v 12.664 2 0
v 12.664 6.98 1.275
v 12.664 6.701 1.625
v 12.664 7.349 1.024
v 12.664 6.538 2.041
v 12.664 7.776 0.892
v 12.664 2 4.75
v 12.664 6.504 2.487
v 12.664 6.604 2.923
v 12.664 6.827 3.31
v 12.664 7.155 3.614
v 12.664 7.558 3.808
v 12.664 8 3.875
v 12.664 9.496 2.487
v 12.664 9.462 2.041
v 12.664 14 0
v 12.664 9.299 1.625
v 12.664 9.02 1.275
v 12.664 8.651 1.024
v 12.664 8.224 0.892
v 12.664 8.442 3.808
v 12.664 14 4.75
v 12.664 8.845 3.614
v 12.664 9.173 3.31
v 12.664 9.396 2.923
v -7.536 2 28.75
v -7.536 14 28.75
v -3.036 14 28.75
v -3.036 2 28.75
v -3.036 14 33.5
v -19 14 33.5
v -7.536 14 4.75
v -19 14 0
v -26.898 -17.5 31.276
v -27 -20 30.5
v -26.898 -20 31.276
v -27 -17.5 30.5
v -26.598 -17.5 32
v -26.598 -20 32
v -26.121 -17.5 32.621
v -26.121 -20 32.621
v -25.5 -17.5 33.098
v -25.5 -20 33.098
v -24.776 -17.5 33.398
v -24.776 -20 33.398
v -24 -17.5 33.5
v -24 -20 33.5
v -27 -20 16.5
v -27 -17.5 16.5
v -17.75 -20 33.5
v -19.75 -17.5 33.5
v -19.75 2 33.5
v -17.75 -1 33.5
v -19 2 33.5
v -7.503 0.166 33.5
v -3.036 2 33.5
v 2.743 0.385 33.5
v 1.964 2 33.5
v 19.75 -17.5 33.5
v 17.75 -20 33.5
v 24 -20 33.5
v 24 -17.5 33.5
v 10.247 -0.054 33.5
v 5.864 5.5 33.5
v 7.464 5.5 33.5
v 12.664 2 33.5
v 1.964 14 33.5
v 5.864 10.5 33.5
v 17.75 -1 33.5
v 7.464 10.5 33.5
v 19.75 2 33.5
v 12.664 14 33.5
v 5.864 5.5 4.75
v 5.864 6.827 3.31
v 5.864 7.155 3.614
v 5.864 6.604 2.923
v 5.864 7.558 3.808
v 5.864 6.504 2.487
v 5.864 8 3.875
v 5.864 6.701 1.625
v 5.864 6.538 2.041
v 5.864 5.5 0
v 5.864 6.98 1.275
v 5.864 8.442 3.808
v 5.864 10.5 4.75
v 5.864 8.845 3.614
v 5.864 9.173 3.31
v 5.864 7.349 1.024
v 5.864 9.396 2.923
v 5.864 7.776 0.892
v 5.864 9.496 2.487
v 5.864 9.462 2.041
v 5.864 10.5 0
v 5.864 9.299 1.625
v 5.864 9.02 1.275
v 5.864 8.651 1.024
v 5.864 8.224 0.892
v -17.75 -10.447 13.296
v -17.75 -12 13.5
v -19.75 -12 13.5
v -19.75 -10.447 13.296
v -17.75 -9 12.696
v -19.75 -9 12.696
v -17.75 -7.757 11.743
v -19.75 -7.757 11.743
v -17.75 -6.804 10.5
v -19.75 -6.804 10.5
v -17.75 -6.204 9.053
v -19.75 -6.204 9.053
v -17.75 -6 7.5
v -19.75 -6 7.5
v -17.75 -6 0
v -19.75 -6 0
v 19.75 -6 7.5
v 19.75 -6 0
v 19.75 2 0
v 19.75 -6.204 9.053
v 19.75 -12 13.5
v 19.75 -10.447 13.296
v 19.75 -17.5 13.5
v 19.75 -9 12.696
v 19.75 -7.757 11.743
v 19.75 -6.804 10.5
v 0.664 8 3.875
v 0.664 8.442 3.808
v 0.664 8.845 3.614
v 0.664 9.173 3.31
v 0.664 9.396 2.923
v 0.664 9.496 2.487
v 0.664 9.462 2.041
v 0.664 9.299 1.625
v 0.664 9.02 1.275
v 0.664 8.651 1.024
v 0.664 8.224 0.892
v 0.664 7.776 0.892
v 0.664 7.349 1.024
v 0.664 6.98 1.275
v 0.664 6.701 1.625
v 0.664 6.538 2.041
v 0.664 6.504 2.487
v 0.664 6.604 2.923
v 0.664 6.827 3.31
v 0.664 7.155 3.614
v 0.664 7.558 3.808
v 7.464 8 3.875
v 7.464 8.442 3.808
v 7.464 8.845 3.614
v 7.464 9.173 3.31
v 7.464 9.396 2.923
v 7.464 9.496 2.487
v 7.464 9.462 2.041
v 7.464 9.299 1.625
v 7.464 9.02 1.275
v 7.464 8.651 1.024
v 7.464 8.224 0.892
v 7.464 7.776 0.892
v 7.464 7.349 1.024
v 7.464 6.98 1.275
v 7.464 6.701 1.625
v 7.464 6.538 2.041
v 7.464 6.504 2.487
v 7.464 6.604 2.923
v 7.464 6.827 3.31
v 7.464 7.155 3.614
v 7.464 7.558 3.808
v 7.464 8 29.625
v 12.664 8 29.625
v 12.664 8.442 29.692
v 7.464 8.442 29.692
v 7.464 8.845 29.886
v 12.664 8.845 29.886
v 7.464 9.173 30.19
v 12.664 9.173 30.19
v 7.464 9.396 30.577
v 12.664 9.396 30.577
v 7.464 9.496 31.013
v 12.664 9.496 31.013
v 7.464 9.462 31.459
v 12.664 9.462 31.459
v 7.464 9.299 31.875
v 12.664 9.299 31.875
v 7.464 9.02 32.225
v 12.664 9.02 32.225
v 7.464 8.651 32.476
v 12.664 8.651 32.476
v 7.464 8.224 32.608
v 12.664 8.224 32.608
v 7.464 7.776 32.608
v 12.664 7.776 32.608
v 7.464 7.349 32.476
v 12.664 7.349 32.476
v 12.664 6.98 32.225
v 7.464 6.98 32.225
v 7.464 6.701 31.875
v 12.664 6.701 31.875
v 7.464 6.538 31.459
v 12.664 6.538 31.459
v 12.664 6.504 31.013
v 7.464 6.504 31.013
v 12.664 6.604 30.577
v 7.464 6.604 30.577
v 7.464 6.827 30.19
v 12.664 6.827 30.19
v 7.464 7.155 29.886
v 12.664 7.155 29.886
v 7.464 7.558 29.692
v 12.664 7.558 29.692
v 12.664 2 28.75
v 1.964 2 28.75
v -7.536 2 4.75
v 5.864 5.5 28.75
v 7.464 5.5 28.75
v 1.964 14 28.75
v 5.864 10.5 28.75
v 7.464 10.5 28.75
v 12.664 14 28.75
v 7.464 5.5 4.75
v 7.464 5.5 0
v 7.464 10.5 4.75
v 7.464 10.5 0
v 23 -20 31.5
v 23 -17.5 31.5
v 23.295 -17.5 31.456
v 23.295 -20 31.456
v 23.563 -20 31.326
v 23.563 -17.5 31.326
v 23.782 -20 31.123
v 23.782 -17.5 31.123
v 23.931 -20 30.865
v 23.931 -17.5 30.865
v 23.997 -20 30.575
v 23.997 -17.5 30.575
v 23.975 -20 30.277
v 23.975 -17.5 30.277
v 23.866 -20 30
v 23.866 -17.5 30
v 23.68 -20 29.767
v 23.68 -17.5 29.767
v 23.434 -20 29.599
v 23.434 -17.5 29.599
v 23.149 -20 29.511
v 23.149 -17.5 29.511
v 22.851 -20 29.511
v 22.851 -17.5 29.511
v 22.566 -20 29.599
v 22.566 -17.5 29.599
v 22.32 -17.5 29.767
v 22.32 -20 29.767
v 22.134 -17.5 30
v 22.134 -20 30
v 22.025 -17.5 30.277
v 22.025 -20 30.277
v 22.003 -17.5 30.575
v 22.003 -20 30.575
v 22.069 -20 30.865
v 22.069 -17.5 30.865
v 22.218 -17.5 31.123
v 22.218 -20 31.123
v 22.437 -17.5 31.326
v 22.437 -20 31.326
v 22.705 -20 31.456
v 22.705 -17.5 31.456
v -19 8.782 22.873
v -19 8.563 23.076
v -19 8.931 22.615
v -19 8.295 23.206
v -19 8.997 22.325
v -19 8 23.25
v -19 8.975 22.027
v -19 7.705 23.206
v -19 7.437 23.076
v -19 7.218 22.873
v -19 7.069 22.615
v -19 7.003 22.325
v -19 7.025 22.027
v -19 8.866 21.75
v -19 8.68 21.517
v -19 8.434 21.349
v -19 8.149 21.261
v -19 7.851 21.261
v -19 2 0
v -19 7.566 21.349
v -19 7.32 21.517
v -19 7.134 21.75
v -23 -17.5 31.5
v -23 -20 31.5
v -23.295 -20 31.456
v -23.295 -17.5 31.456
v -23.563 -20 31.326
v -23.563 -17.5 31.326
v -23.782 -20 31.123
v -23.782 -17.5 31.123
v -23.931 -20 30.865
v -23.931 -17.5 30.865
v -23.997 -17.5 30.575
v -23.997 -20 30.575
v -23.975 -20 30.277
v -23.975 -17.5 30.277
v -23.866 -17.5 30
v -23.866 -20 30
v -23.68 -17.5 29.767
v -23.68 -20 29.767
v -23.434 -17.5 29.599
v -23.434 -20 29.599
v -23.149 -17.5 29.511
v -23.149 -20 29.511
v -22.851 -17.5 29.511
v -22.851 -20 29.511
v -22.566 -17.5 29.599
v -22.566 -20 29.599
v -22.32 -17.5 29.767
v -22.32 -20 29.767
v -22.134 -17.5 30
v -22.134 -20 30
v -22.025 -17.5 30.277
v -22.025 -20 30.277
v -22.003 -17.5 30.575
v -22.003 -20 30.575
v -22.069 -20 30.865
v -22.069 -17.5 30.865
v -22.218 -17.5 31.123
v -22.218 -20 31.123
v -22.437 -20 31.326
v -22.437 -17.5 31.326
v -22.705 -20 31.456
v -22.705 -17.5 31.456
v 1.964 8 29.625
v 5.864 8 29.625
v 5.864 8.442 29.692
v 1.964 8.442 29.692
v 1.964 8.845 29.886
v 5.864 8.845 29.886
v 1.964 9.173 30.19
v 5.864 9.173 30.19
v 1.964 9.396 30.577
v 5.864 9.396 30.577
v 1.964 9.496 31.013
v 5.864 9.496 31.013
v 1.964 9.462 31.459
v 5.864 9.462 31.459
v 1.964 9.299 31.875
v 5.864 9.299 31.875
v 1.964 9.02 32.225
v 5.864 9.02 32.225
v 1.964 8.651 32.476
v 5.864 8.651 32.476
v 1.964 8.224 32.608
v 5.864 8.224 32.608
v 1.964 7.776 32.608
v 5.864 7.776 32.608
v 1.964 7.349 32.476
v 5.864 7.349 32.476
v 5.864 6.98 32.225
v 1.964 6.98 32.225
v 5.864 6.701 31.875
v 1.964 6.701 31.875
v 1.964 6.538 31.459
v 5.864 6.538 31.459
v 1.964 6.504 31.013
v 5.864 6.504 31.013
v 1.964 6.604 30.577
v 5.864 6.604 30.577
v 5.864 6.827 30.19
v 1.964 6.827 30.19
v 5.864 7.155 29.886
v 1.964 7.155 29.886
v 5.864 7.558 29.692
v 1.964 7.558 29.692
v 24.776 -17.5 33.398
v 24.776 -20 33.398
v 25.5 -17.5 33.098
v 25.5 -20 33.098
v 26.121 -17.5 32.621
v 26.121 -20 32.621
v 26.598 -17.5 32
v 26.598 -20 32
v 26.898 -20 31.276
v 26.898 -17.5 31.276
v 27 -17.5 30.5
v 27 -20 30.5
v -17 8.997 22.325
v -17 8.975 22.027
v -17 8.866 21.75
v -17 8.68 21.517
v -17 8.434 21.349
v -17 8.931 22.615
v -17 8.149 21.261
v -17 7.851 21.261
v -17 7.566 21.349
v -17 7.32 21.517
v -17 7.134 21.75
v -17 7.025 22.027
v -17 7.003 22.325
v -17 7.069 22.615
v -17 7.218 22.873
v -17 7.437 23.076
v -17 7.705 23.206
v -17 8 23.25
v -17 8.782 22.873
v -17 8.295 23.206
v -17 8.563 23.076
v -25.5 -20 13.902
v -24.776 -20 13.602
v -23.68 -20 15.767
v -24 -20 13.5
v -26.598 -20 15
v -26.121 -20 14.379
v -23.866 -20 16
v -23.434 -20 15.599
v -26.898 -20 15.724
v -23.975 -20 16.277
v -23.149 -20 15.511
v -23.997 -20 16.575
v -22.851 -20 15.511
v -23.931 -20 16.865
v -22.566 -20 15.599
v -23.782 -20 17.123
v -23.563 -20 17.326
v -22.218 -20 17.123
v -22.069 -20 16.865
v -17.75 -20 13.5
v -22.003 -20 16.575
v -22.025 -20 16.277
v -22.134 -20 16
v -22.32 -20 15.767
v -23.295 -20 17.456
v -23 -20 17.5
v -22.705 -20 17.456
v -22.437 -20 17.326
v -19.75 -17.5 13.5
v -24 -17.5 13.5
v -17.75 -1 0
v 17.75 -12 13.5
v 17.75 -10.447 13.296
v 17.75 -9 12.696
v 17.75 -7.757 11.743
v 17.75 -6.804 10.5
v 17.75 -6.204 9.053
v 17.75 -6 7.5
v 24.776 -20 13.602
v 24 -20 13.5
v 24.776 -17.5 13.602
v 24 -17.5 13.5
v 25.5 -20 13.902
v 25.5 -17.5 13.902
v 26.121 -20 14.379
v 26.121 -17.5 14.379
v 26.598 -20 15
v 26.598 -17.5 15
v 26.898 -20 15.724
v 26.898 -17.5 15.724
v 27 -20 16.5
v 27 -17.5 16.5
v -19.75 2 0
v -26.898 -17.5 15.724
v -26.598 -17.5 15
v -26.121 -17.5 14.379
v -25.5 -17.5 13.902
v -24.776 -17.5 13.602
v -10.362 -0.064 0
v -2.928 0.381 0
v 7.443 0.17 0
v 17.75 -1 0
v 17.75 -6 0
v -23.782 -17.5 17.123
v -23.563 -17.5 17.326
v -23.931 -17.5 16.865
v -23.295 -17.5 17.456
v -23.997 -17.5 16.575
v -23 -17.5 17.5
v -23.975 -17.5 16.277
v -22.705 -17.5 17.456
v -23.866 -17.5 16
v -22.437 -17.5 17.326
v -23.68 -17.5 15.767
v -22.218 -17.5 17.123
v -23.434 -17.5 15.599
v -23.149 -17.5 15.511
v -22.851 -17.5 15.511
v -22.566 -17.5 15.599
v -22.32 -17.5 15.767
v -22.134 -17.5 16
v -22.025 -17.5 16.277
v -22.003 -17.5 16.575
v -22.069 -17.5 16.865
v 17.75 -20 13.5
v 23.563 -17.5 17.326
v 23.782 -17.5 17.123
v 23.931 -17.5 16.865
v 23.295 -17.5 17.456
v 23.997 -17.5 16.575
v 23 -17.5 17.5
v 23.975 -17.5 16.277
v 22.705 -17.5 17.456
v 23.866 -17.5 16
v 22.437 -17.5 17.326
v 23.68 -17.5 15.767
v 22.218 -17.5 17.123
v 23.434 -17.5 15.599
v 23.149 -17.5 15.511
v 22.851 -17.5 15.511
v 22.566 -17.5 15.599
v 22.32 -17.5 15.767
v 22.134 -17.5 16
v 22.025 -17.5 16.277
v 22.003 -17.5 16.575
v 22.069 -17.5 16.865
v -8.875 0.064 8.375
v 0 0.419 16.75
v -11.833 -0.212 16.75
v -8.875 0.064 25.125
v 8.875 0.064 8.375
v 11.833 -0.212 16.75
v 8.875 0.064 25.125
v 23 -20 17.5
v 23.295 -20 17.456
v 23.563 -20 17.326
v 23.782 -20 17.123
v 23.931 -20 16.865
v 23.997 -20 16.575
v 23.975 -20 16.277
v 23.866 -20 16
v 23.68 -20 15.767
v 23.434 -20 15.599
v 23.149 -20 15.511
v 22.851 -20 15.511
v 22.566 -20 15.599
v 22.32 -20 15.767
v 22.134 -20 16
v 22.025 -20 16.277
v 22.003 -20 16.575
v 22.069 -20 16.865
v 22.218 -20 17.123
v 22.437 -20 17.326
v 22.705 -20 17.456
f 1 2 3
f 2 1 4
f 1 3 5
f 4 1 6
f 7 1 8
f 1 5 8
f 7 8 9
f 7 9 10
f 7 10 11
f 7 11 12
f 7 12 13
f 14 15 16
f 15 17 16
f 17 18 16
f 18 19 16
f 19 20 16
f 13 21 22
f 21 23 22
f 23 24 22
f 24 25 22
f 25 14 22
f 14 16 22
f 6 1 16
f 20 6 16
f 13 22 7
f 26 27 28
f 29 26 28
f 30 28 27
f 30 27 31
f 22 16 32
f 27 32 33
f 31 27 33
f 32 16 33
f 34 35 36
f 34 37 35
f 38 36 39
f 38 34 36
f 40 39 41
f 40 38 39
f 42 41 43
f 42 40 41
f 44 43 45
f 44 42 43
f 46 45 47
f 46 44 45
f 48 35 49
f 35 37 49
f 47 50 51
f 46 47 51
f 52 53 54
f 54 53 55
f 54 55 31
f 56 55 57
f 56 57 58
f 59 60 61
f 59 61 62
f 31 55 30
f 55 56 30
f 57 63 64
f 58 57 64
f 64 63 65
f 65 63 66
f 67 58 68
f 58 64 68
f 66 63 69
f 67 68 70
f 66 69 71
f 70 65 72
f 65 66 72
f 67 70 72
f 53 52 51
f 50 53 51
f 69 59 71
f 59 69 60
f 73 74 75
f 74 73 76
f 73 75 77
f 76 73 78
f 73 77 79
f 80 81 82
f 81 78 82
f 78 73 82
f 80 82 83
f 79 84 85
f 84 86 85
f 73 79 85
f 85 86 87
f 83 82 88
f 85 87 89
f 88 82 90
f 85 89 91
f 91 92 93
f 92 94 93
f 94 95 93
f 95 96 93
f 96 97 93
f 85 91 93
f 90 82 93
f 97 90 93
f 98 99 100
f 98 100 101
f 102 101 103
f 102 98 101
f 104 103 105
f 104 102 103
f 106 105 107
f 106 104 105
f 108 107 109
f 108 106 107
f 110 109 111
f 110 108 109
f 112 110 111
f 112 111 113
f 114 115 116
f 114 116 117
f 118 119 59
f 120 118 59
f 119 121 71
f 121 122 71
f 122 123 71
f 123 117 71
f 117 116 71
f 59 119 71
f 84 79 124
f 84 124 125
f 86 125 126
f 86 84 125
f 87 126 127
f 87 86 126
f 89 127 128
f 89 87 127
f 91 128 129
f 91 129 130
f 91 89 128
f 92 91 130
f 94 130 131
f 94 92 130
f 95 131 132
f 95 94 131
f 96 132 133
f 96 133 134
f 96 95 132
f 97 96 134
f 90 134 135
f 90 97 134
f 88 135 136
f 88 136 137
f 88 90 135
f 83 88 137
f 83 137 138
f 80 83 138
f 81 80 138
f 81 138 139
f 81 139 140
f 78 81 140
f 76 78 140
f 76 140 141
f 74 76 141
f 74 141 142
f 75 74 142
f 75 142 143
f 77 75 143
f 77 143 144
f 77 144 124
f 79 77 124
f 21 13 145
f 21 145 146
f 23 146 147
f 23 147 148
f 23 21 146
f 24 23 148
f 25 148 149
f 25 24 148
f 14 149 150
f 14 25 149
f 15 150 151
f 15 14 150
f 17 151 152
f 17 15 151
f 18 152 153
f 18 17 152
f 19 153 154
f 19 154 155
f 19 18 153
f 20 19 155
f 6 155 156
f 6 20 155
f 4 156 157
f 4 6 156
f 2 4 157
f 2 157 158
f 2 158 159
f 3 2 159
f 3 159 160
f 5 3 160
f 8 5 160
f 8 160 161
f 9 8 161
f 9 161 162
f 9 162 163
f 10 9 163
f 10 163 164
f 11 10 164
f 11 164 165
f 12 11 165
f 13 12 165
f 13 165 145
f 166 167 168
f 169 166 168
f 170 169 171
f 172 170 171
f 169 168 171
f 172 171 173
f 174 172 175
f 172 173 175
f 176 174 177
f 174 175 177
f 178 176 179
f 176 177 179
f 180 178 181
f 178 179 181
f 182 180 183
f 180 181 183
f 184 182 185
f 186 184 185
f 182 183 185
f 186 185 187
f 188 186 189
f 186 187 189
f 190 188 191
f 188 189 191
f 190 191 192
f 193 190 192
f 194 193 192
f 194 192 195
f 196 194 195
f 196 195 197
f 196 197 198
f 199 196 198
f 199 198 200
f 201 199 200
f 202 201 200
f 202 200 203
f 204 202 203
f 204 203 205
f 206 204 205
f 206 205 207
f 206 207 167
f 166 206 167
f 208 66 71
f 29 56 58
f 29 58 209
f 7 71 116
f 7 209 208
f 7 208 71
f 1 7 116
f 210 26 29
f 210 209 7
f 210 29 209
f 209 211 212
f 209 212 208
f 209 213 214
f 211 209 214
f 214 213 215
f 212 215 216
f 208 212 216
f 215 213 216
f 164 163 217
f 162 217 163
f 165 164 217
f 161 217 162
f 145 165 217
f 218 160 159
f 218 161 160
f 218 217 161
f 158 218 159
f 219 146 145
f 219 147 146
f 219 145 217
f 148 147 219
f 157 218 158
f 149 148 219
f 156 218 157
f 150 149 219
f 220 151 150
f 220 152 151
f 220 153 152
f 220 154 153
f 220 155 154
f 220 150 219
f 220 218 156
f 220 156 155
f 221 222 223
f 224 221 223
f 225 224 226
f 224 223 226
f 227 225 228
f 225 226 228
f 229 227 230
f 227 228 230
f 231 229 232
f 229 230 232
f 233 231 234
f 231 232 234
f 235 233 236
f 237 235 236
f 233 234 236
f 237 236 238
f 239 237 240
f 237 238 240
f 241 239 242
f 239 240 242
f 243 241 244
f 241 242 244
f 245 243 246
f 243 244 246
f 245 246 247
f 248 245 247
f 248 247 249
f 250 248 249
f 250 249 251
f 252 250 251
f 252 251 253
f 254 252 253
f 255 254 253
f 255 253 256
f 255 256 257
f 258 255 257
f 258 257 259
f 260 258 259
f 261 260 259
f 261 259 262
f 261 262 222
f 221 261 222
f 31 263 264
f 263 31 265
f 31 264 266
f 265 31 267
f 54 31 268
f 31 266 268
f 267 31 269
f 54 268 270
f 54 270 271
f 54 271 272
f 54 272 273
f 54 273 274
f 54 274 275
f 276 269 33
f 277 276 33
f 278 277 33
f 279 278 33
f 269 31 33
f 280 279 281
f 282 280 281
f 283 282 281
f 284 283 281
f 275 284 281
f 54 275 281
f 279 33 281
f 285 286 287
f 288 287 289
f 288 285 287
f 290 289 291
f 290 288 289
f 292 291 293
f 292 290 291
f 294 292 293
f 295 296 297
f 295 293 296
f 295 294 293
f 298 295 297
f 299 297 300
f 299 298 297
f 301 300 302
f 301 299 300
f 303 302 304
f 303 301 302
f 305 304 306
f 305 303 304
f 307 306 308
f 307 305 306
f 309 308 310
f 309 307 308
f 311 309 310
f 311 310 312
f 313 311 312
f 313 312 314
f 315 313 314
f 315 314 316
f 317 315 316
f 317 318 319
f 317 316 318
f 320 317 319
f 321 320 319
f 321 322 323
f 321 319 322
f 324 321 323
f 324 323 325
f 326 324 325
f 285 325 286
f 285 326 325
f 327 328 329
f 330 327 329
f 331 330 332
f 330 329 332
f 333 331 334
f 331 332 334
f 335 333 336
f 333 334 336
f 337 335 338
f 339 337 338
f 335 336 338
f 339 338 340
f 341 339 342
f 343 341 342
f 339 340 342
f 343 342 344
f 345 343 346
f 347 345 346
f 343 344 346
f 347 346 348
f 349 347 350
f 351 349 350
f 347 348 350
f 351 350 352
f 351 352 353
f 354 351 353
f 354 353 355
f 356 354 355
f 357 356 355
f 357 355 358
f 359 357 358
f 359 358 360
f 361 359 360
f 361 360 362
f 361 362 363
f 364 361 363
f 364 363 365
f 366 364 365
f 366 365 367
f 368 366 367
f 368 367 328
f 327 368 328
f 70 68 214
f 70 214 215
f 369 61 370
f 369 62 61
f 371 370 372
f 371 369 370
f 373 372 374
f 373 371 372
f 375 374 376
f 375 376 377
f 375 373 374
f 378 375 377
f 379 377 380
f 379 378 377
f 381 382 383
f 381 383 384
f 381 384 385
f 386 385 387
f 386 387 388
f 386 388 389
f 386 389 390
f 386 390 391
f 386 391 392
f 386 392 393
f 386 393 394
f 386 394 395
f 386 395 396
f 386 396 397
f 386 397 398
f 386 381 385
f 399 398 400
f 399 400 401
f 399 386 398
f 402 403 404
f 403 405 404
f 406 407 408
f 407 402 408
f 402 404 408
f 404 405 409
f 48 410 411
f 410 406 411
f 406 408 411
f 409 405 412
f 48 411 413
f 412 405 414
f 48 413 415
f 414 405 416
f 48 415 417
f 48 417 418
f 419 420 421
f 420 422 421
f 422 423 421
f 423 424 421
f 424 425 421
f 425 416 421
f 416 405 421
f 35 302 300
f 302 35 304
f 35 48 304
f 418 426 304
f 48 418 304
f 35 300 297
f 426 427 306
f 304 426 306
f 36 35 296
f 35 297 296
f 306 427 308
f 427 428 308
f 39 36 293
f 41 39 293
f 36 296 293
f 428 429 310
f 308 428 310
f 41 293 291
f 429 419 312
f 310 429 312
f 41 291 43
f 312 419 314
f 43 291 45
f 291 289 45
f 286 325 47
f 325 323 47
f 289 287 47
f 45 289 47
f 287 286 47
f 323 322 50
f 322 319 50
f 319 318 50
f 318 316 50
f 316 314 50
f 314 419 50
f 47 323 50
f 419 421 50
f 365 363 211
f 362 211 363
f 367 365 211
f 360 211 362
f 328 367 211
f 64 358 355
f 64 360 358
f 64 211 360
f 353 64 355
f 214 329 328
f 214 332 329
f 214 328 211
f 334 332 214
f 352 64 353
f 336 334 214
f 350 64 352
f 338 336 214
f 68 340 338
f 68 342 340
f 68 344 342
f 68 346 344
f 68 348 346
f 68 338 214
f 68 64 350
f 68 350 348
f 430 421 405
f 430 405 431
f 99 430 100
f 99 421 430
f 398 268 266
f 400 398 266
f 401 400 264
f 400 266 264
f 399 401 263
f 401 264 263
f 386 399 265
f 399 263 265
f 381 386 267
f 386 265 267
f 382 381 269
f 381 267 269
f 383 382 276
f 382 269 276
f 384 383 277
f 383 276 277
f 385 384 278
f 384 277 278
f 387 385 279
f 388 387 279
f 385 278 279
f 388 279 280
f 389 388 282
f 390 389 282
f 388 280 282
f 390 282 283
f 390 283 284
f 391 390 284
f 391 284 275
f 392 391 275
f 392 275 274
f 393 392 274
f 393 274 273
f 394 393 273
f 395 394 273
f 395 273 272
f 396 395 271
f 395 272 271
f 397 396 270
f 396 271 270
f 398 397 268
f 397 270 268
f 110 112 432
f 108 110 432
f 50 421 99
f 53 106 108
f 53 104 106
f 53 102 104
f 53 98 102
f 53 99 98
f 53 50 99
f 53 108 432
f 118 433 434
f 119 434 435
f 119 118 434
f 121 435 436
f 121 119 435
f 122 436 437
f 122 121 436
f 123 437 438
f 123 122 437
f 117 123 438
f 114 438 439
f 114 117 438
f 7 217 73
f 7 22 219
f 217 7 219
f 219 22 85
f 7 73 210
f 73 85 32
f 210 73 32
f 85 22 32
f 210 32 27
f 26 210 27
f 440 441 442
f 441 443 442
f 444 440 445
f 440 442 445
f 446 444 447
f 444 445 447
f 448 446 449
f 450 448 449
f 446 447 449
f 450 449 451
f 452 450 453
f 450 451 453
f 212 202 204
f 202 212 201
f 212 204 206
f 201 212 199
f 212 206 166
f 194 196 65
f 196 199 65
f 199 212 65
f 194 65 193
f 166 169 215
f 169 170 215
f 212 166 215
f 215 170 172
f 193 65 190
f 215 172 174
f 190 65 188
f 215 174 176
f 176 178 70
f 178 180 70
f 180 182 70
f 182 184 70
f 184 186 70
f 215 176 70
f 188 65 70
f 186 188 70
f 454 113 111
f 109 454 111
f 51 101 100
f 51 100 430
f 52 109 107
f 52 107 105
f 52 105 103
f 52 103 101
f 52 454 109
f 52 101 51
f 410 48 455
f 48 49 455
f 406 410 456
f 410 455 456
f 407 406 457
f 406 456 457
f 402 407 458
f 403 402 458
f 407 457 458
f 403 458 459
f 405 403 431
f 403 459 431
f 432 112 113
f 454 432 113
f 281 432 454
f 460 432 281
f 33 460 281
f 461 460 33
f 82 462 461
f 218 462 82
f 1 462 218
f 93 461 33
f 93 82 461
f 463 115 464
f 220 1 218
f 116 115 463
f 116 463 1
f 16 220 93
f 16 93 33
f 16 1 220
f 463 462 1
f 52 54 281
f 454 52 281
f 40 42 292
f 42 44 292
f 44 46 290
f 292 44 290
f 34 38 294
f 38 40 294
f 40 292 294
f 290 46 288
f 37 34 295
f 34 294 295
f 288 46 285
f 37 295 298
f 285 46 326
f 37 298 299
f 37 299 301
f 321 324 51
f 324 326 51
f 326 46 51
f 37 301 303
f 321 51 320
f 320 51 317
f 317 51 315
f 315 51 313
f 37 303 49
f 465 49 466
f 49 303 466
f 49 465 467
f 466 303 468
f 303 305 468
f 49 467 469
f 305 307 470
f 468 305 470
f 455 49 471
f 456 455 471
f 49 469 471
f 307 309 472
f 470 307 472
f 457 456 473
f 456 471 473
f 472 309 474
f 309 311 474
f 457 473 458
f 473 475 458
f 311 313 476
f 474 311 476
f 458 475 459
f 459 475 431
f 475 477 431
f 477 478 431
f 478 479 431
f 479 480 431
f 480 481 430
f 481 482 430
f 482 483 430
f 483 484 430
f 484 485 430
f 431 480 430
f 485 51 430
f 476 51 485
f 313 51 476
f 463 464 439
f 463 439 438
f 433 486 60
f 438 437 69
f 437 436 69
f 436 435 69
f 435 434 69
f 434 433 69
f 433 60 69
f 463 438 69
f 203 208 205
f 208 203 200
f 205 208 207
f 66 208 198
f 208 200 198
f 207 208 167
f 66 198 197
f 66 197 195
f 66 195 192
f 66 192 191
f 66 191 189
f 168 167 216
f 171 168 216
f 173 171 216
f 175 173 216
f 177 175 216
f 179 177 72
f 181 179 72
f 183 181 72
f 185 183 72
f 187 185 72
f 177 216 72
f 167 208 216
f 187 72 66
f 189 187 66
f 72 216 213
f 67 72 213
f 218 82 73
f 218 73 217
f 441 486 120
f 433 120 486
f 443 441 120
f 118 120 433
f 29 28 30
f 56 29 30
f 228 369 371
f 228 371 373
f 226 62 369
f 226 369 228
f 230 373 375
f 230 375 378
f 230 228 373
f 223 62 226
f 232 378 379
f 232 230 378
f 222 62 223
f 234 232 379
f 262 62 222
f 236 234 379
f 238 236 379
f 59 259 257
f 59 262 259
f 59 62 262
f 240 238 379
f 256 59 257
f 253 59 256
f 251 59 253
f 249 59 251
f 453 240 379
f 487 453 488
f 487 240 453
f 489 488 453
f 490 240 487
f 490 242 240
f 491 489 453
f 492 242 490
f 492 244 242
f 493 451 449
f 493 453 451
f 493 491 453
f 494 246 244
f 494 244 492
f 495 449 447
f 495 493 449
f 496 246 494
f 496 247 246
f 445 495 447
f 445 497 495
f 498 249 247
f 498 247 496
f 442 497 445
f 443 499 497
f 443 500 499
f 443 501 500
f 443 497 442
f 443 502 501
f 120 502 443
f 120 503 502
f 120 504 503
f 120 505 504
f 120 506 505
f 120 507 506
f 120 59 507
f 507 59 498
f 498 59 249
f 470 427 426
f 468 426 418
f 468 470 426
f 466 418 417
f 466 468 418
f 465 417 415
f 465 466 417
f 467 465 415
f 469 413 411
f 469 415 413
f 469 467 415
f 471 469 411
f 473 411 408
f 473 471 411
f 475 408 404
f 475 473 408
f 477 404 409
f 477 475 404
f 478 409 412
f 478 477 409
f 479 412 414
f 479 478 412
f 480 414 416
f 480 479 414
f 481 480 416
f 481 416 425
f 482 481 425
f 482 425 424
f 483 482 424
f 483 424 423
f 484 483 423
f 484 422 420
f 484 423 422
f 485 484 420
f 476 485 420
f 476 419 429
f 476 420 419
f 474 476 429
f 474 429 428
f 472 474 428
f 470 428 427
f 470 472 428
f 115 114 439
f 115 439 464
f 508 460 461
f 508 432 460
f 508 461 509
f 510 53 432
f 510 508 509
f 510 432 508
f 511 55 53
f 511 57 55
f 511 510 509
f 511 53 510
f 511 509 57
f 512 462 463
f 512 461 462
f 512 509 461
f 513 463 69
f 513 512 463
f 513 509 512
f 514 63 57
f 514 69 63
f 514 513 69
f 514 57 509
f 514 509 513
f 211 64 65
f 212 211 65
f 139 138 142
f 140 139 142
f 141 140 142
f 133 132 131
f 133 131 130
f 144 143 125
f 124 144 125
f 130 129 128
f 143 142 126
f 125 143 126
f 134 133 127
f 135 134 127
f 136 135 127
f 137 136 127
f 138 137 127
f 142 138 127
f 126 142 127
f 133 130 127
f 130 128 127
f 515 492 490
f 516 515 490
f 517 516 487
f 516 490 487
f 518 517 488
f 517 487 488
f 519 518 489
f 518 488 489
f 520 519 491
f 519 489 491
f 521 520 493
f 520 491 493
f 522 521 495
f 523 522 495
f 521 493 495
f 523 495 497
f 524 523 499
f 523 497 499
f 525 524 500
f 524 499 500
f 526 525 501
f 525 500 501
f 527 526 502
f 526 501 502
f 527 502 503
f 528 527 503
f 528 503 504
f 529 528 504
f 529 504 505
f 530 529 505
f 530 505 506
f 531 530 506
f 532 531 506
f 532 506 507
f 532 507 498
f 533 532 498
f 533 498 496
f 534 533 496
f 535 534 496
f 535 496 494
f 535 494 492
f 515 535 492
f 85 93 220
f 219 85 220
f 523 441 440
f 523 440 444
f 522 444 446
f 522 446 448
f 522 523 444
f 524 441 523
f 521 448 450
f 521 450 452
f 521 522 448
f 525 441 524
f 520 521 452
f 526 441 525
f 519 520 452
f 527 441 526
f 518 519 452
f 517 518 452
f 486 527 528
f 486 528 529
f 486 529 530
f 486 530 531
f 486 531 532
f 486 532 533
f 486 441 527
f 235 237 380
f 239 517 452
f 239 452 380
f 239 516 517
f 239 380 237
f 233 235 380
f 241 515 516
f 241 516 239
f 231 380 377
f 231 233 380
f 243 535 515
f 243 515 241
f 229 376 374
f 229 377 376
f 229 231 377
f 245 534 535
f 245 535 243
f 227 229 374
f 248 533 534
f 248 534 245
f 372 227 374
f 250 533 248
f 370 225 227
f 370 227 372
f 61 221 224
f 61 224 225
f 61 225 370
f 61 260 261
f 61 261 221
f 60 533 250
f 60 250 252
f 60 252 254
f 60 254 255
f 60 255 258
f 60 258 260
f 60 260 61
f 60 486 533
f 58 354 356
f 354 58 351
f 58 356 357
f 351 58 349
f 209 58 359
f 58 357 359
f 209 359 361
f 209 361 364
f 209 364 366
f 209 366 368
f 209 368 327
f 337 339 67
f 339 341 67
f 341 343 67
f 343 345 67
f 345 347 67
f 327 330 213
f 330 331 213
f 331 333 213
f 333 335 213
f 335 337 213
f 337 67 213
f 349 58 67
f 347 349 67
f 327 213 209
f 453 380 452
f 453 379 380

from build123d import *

# Parameters (mm, degrees)
BOSS_EXTRUDE1_DEPTH      = 33.5
SKETCH2_W                = 20
SKETCH2_H                = 2.5
BOSS_EXTRUDE2_DEPTH      = 8
CUT_EXTRUDE5_DEPTH       = 12
RESSALTO_EXTRUS_O4_DEPTH = 0.75
SKETCH6_R                = 1.5
CUT_EXTRUDE6_DEPTH       = 12
CUT_EXTRUDE8_REACH       = 49.447
SKETCH14_W               = 1.6
SKETCH14_H               = 5
SKETCH9_R                = 1
CORTE_EXTRUS_O1_DEPTH    = 54.324478432
FILETE1_R                = 3
ESBO_O6_R                = 1
CORTE_EXTRUS_O6_DEPTH    = 2
ESBO_O8_W                = 0.75
ESBO_O8_H                = 19
ESBO_O8_H_2              = 14
CORTE_EXTRUS_O8_DEPTH    = 48.44733923
FILETE1_OF_ESPELHAR1_R   = 3
CORTE_EXTRUS_O9_DEPTH    = 48.44733923
CORTE_EXTRUS_O10_DEPTH   = 61.891809882


with BuildPart() as part:
    # Sketch1 → Boss-Extrude1 (new body)
    with BuildSketch(Plane.XY):
        Polygon((17, -20), (19, -20), (19, 14), (-19, 14), (-19, -20), (-17, -20), (-17, -1), (17, -1), align=None)
    extrude(amount=BOSS_EXTRUDE1_DEPTH)

    # Sketch2 → Boss-Extrude2 (add)
    with BuildSketch(Plane(origin=(19, 0, 0), x_dir=(0, 0, -1), z_dir=(1, 0, 0))):
        with Locations((-23.5, -18.75)):
            Rectangle(SKETCH2_W, SKETCH2_H)
    boss_extrude2 = extrude(amount=BOSS_EXTRUDE2_DEPTH)

    # Sketch12 → Cut-Extrude5 (cut)
    with BuildSketch(Plane(origin=(0, 14, 0), x_dir=(1, 0, 0), z_dir=(0, 1, 0))):
        Polygon((-7.535857559, -4.75), (-7.535857559, -28.75), (-3.035857559, -28.75), (-3.035857559, -33.5), (1.964142441, -33.5), (1.964142441, -28.75), (12.664142441, -28.75), (12.664142441, -33.5), (19, -33.5), (19, 0), (12.664142441, 0), (12.664142441, -4.75), align=None)
    extrude(amount=-CUT_EXTRUDE5_DEPTH, mode=Mode.SUBTRACT)

    # Esboço10 → Ressalto-extrusão4 (add)
    with BuildSketch(Plane(origin=(19, 0, 0), x_dir=(0, 0, -1), z_dir=(1, 0, 0))):
        Polygon((-33.5, 2), (0, 2), (0, -17.5), (0, -20), (-13.5, -20), (-13.5, -17.5), (-33.5, -17.5), align=None)
    ressalto_extrus_o4 = extrude(amount=RESSALTO_EXTRUS_O4_DEPTH)

    # Sketch6 → Cut-Extrude6 (cut)
    with BuildSketch(Plane(origin=(12.664142441, 0, 0), x_dir=(0, 0, -1), z_dir=(1, 0, 0))):
        with Locations((-31.125, 8)):
            Circle(SKETCH6_R)
    cut_extrude6 = extrude(amount=-CUT_EXTRUDE6_DEPTH, mode=Mode.SUBTRACT)

    # Sketch14 → Cut-Extrude8 (cut, up to next)
    with BuildSketch(Plane.XY.offset(33.5), mode=Mode.PRIVATE) as cut_extrude8_sk1:
        with Locations((6.664142441, 8)):
            Rectangle(SKETCH14_W, SKETCH14_H)
    cut_extrude8_tool1 = extrude(cut_extrude8_sk1.sketch, amount=-CUT_EXTRUDE8_REACH, mode=Mode.PRIVATE) & part.part
    cut_extrude8 = cut_extrude8_tool1.solids().sort_by_distance((6.664142, 8, 33.5))[0]
    add(cut_extrude8, mode=Mode.SUBTRACT)

    # Mirror6: Cut-Extrude6, Cut-Extrude8 across plane
    add(cut_extrude6.mirror(Plane.XY.offset(16.75)), mode=Mode.SUBTRACT)
    add(cut_extrude8.mirror(Plane.XY.offset(16.75)), mode=Mode.SUBTRACT)

    # Sketch9 → Corte-extrusão1 (cut, through all)
    with BuildSketch(Plane(origin=(0, -17.5, 0), x_dir=(1, 0, 0), z_dir=(0, 1, 0))):
        with Locations(Location((23, -16.5, 0), (0, 0, 270))):
            Circle(SKETCH9_R)
        with Locations(Location((23, -30.5, 0), (0, 0, 270))):
            Circle(SKETCH9_R)
    corte_extrus_o1 = extrude(amount=-CORTE_EXTRUS_O1_DEPTH, mode=Mode.SUBTRACT)

    # Filete1
    filete1_edges = [part.edges().sort_by_distance(p)[0] for p in [
        (27, -18.75, 13.5),
        (27, -18.75, 33.5),
    ]]
    fillet(filete1_edges, radius=FILETE1_R)

    # Esboço6 → Corte-extrusão6 (cut)
    with BuildSketch(Plane.ZY.offset(19)):
        with Locations((22.25, 8)):
            Circle(ESBO_O6_R)
    extrude(amount=-CORTE_EXTRUS_O6_DEPTH, mode=Mode.SUBTRACT)

    # Esboço8 → Corte-extrusão8 (cut, through all)
    with BuildSketch(Plane.XY.offset(33.5)):
        with Locations((17.375, -10.5)):
            Rectangle(ESBO_O8_W, ESBO_O8_H)
        with Locations((-17.375, -8)):
            Rectangle(ESBO_O8_W, ESBO_O8_H_2)
    corte_extrus_o8 = extrude(amount=-CORTE_EXTRUS_O8_DEPTH, mode=Mode.SUBTRACT)

    # Espelhar1: Boss-Extrude2, Ressalto-extrusão4, Corte-extrusão1, Corte-extrusão8 across plane
    add(boss_extrude2.mirror(Plane(origin=(0, 0, 0), x_dir=(0, 0, 1), z_dir=(1, 0, 0))))
    add(ressalto_extrus_o4.mirror(Plane(origin=(0, 0, 0), x_dir=(0, 0, 1), z_dir=(1, 0, 0))))
    add(corte_extrus_o1.mirror(Plane(origin=(0, 0, 0), x_dir=(0, 0, 1), z_dir=(1, 0, 0))), mode=Mode.SUBTRACT)
    add(corte_extrus_o8.mirror(Plane(origin=(0, 0, 0), x_dir=(0, 0, 1), z_dir=(1, 0, 0))), mode=Mode.SUBTRACT)

    # Filete1 of Espelhar1
    filete1_of_espelhar1_edges = [part.edges().sort_by_distance(p)[0] for p in [
        (-27, -18.75, 13.5),
        (-27, -18.75, 33.5),
    ]]
    fillet(filete1_of_espelhar1_edges, radius=FILETE1_OF_ESPELHAR1_R)

    # Esboço11 → Corte-extrusão9 (cut, through all)
    with BuildSketch(Plane.XY.offset(33.5)):
        with BuildLine():
            Line((-17.75, -1), (17.75, -1))
            add(Edge.make_bspline(
                [(-17.75, -1), (0, 1.838465609), (17.75, -1)],
                knots=[0, 0, 0, 1, 1, 1], degree=2))
        make_face()
    extrude(amount=-CORTE_EXTRUS_O9_DEPTH, mode=Mode.SUBTRACT)

    # Esboço12 → Corte-extrusão10 (cut, through all)
    with BuildSketch(Plane(origin=(19.75, 0, 0), x_dir=(0, 0, -1), z_dir=(1, 0, 0))):
        with BuildLine():
            Line((0, -20), (-13.5, -20))
            Line((-13.5, -20), (-13.5, -12))
            ThreePointArc((-13.5, -12), (-11.742640687, -7.757359313), (-7.5, -6))
            Line((-7.5, -6), (0, -6))
            Line((0, -6), (0, -20))
        make_face()
    extrude(amount=-CORTE_EXTRUS_O10_DEPTH, mode=Mode.SUBTRACT)


solid = part.part
